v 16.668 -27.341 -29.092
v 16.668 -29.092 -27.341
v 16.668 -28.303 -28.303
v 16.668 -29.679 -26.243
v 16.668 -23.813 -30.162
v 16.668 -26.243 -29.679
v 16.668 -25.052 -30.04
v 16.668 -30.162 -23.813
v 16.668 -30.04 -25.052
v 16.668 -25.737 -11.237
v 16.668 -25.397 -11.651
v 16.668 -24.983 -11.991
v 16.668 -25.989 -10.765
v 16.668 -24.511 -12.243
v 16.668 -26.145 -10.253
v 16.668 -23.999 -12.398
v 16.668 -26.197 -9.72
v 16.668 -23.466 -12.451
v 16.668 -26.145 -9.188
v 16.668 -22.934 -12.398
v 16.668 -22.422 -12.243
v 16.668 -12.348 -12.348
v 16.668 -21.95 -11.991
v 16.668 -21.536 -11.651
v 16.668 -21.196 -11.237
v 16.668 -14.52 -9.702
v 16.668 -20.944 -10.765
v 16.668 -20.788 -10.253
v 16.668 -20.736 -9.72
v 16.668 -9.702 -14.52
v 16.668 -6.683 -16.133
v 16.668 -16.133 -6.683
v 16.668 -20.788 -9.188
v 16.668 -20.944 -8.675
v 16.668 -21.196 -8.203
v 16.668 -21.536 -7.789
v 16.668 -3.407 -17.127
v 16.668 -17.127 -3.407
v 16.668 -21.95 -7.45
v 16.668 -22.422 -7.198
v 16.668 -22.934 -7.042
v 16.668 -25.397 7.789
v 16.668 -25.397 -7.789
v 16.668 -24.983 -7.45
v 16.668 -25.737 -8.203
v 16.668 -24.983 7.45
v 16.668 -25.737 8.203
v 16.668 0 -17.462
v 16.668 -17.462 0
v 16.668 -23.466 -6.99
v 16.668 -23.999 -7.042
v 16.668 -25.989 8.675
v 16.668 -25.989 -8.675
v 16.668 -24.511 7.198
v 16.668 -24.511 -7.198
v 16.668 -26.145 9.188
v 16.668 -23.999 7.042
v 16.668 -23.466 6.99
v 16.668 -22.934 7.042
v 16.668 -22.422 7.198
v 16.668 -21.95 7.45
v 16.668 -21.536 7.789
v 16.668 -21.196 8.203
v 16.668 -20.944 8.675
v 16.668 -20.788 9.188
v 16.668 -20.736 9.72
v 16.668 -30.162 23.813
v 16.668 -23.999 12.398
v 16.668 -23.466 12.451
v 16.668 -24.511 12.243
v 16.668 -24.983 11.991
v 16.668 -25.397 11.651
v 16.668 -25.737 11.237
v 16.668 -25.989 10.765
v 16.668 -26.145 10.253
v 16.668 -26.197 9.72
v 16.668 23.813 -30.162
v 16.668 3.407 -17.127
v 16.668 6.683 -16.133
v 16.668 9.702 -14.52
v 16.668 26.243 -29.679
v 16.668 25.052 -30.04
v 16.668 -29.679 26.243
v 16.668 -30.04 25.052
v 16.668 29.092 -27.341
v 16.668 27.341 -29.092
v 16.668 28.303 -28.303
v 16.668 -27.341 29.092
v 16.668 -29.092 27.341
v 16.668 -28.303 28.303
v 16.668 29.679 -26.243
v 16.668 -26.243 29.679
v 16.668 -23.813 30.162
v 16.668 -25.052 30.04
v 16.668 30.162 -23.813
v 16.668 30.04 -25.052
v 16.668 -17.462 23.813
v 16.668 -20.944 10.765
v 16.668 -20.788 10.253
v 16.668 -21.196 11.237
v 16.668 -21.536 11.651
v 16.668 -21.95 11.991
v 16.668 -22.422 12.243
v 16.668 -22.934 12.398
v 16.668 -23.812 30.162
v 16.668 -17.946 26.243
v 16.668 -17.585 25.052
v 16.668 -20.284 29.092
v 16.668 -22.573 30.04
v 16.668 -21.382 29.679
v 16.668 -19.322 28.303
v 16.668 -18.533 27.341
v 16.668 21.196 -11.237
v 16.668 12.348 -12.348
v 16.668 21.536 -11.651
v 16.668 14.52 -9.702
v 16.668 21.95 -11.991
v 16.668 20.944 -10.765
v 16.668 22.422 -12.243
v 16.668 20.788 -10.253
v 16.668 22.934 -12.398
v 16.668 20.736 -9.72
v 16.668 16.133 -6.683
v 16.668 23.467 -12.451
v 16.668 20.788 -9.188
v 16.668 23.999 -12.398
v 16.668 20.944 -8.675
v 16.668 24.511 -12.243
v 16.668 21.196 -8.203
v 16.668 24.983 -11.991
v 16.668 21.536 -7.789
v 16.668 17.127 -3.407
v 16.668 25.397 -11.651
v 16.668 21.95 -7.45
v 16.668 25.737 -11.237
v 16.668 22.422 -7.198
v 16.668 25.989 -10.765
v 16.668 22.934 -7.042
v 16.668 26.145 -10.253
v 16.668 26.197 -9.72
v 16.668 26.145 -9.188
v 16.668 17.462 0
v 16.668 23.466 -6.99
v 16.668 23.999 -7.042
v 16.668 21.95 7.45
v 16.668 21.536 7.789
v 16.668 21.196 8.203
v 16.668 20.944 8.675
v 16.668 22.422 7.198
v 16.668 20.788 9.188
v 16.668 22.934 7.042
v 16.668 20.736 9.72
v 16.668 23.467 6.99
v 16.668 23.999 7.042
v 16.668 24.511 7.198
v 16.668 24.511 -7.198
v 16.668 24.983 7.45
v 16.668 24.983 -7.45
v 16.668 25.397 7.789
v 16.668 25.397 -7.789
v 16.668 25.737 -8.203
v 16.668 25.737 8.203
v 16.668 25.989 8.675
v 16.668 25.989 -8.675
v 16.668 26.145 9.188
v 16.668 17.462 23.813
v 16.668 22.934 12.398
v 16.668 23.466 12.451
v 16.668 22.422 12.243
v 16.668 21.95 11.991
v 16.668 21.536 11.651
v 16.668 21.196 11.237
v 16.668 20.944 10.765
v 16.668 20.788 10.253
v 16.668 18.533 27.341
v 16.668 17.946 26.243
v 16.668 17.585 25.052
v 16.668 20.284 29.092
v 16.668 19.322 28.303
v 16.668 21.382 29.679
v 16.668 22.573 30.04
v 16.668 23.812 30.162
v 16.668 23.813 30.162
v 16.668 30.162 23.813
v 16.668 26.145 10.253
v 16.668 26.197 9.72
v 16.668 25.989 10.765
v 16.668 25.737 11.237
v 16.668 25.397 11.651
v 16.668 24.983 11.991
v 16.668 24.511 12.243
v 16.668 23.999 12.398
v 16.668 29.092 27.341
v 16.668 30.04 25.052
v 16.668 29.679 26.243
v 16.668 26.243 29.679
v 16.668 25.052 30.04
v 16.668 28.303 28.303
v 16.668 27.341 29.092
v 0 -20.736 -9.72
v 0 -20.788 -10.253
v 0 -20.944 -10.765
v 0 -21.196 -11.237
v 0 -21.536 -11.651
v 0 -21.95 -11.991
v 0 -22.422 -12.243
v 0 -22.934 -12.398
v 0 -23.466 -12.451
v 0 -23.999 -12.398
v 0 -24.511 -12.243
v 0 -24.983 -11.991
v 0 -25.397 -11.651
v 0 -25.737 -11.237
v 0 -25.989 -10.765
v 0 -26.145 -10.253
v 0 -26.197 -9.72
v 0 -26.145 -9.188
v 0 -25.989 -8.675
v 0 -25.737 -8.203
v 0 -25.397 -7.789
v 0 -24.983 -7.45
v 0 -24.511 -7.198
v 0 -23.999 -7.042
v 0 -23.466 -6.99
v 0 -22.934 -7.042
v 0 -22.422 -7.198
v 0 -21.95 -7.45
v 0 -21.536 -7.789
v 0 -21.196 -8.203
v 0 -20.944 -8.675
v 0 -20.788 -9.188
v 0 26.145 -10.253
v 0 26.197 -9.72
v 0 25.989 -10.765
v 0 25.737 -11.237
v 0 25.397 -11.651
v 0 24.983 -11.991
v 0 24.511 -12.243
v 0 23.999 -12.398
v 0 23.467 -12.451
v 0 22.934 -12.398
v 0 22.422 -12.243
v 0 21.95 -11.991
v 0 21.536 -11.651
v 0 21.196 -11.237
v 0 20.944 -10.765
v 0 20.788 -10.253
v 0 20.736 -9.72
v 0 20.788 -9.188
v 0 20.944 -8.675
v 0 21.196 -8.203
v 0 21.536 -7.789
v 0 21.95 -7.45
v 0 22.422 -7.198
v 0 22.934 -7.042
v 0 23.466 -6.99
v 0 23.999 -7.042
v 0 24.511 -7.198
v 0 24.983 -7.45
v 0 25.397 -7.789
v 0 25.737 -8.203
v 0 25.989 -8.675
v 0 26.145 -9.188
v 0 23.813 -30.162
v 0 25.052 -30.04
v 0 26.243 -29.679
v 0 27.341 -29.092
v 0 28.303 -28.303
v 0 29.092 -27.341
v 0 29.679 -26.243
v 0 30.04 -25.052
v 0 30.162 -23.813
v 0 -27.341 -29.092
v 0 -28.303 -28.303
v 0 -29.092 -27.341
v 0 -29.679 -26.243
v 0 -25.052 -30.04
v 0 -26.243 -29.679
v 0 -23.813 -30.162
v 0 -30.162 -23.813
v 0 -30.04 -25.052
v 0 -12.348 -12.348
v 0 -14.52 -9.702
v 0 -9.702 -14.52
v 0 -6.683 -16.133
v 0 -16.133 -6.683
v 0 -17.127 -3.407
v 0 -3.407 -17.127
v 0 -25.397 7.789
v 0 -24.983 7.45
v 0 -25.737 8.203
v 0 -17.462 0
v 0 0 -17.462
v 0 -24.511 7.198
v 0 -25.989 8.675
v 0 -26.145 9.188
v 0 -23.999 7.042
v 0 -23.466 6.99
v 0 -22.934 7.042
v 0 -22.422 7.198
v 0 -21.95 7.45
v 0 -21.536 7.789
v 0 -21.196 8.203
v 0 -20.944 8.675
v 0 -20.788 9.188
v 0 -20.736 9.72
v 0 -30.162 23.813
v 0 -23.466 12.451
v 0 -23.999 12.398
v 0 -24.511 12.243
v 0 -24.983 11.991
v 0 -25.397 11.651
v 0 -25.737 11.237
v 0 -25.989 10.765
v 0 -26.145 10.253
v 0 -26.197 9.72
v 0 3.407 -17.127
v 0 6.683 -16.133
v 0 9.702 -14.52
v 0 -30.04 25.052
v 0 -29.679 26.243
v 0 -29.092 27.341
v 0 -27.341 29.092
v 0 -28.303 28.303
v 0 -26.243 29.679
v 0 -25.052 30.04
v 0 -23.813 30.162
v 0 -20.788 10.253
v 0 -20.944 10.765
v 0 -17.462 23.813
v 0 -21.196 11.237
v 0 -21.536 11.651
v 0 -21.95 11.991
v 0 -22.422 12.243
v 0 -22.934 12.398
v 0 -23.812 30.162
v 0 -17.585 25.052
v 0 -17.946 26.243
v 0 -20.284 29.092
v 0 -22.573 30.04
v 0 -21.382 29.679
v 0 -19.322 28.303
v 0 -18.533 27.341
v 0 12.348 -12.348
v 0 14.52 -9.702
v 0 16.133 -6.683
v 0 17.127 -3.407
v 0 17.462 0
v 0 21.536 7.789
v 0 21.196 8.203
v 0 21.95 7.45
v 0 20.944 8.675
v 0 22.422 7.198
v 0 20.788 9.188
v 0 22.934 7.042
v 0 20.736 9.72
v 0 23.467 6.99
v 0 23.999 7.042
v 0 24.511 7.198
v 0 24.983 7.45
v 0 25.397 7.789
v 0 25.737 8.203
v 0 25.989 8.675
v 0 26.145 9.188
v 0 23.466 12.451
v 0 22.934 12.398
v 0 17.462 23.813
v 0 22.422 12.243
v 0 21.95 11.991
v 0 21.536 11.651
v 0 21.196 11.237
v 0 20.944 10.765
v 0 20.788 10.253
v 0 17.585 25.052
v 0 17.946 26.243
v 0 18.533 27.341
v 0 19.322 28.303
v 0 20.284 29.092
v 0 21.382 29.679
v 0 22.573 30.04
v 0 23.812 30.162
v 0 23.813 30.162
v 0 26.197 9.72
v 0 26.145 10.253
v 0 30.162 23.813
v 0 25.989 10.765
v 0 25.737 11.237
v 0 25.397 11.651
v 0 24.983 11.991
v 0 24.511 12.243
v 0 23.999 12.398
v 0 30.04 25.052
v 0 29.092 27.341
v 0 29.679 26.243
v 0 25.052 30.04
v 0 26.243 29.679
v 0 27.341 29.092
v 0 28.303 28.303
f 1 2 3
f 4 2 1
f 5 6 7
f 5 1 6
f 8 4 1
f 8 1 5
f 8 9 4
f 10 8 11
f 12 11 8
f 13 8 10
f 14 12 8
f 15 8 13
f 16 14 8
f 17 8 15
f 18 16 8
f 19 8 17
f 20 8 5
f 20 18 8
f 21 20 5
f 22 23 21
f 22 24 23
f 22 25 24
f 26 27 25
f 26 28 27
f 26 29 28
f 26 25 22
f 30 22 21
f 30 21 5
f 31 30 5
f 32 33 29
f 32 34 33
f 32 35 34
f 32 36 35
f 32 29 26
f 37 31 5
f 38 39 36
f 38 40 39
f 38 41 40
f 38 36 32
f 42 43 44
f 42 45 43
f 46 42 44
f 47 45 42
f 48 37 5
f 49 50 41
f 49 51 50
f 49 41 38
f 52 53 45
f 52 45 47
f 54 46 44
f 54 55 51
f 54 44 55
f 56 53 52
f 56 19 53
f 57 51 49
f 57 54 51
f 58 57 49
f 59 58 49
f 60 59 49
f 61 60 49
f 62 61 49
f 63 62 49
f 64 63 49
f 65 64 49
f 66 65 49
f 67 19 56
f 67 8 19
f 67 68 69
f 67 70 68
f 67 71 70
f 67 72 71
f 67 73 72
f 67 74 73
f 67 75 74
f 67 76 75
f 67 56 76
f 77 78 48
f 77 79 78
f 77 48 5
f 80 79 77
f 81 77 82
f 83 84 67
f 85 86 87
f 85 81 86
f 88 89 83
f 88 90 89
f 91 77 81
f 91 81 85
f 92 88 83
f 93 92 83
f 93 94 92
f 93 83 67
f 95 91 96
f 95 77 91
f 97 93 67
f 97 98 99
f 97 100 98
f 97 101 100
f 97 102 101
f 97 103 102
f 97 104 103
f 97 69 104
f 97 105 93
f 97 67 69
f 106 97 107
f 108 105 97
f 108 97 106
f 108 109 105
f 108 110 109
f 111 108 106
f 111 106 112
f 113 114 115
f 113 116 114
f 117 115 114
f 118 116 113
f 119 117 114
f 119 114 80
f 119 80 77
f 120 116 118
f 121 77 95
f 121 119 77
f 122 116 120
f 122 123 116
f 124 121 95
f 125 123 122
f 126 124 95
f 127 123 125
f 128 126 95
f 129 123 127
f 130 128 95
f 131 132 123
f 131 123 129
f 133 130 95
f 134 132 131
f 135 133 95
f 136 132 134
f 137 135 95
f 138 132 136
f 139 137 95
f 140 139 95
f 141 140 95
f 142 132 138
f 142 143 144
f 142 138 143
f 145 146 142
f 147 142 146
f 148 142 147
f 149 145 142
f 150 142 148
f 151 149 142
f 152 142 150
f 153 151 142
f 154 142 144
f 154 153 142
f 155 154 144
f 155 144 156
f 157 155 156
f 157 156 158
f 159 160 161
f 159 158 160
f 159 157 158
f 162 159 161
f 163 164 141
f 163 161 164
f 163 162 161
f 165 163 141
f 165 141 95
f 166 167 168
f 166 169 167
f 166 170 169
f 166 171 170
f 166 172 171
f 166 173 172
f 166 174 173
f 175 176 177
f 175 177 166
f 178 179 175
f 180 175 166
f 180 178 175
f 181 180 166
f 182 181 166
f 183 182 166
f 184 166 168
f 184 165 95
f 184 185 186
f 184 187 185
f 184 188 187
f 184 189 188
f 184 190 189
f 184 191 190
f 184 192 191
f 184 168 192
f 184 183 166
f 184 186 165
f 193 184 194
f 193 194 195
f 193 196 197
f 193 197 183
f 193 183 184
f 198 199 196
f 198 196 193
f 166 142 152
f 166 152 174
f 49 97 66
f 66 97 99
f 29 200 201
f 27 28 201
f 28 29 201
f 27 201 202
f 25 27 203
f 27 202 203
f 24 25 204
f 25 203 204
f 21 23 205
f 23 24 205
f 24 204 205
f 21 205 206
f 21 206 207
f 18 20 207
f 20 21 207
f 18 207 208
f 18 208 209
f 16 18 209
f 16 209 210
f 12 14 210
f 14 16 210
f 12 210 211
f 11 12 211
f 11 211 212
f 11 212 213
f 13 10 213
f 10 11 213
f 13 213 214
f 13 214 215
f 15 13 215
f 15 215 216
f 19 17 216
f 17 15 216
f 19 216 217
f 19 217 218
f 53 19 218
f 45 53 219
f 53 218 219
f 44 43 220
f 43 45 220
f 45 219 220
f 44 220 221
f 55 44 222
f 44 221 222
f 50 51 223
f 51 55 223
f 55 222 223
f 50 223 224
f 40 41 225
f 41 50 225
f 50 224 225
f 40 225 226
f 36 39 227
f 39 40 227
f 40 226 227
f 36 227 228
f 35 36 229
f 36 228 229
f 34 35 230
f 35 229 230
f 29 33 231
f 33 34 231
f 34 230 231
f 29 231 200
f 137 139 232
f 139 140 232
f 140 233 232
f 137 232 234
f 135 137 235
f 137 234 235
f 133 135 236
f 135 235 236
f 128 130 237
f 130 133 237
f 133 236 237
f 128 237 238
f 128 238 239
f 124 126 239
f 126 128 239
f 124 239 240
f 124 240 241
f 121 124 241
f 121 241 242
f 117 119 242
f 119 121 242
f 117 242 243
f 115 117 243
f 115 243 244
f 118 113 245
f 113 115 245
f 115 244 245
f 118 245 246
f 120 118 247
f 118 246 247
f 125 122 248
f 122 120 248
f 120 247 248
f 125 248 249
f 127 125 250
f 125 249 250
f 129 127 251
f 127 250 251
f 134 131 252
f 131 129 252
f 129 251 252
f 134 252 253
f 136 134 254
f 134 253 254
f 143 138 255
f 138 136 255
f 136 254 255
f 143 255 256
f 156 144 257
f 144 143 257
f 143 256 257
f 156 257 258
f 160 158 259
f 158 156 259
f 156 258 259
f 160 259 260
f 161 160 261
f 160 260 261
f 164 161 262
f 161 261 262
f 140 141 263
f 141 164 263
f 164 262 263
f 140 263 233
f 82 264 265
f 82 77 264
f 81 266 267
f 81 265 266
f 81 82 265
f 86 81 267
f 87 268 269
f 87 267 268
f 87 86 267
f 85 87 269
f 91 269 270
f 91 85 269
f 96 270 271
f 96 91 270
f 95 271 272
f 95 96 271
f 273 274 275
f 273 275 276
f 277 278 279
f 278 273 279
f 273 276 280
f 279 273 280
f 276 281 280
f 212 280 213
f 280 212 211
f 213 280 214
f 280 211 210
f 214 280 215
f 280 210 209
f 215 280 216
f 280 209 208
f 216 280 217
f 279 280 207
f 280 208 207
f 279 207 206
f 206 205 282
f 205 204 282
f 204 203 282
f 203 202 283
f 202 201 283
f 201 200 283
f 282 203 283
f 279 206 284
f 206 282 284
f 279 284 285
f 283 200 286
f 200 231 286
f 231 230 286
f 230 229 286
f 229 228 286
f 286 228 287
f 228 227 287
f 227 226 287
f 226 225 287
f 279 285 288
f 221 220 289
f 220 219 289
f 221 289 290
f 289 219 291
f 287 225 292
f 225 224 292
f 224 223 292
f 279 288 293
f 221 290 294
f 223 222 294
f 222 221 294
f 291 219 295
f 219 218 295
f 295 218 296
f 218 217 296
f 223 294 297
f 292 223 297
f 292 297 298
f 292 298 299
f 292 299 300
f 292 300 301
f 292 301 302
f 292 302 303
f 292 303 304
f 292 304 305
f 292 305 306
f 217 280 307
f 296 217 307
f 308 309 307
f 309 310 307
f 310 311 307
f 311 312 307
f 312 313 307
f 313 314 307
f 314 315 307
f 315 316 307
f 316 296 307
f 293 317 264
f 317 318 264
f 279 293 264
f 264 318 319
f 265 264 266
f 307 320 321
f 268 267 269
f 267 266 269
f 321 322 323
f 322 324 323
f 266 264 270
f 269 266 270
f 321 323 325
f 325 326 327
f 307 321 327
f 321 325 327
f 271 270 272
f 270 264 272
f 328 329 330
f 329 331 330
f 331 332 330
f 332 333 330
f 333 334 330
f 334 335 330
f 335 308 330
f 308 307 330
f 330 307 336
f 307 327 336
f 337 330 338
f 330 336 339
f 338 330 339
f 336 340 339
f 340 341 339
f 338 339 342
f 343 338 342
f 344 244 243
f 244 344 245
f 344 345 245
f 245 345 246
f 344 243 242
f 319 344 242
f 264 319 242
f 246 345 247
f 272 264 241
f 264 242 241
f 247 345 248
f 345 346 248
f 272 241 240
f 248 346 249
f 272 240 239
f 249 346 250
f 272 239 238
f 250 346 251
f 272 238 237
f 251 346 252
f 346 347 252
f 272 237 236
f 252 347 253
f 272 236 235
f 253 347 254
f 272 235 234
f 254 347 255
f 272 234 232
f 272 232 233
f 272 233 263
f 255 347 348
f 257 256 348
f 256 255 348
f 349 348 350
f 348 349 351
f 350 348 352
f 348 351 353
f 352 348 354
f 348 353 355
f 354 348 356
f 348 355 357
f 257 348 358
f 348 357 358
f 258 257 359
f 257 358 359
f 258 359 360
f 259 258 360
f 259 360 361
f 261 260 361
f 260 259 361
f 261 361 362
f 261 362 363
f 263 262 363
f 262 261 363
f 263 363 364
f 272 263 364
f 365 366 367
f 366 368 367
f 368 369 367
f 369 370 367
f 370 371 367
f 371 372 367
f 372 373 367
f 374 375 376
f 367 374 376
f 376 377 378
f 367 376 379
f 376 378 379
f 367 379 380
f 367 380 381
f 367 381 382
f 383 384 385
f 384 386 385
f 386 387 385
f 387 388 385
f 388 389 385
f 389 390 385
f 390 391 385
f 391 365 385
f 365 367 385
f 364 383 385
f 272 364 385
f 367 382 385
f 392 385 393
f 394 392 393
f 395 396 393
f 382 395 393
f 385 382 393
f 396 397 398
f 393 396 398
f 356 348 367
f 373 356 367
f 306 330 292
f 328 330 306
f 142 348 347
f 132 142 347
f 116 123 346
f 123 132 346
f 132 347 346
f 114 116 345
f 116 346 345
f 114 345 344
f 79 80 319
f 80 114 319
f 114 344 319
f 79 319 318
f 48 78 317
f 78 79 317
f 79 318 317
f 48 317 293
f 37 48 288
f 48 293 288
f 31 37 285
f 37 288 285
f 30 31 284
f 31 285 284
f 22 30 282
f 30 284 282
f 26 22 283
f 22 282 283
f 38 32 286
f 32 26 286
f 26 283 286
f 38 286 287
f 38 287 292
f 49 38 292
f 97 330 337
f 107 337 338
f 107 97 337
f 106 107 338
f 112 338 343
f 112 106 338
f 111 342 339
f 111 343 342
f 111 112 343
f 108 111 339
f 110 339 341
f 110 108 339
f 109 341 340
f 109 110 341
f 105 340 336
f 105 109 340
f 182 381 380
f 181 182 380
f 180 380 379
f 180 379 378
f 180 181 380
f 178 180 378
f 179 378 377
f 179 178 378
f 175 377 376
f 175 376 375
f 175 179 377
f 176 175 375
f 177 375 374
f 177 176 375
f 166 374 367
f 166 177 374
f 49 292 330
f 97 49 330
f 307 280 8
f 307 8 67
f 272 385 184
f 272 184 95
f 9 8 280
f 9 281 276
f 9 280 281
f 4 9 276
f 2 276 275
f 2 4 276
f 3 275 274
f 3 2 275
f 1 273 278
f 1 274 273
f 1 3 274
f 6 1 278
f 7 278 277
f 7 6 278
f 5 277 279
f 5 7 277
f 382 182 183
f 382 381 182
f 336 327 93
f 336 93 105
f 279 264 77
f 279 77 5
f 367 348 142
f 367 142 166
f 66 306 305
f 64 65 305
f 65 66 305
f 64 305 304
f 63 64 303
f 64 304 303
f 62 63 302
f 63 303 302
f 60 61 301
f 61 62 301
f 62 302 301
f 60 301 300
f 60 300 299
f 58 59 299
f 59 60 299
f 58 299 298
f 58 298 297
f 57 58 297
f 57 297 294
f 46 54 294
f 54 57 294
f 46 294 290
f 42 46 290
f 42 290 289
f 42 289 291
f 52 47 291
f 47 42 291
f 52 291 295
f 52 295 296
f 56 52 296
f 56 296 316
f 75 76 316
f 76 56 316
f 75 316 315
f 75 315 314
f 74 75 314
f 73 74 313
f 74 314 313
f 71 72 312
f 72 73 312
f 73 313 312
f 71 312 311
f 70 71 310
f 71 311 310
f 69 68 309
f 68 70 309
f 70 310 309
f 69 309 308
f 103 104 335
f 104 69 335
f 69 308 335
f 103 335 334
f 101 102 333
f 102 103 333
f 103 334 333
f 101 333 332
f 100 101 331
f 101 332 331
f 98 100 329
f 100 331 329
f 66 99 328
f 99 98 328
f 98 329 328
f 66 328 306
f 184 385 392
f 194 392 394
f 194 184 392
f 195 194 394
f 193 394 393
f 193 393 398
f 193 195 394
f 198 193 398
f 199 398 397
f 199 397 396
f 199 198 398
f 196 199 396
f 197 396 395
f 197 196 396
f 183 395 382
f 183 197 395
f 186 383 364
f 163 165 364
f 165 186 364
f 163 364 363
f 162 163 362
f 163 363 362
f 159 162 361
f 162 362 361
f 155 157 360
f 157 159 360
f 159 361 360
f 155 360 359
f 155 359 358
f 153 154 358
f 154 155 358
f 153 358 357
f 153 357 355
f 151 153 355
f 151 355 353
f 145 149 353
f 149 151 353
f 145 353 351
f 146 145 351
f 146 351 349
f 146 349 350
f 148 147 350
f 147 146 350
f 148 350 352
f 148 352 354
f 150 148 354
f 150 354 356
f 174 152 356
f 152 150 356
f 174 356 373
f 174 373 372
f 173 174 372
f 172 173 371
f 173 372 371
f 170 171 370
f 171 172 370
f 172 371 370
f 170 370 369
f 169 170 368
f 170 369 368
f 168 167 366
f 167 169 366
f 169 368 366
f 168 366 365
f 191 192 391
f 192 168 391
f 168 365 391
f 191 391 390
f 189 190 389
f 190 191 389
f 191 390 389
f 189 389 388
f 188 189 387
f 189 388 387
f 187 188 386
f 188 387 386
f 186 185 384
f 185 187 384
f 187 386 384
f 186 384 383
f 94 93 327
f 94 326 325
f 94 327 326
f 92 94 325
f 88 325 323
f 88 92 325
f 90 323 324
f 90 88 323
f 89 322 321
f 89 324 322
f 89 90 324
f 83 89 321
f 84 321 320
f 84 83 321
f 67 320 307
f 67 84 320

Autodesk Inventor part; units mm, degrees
ref_plane "YZ Plane" through (0, 0, 0) normal (1, 0, 0) x (0, 1, 0)
ref_plane "XZ Plane" through (0, 0, 0) normal (0, 1, 0) x (-1, 0, 0)
ref_plane "XY Plane" through (0, 0, 0) normal (0, 0, 1) x (1, 0, 0)
sketch "Sketch2" plane through (0, 0, 0) normal (1, 0, 0) x (0, 1, 0)
  line L0 (30.1625, 30.1625) -> (30.1625, -30.1625)
  line L1 (30.1625, -30.1625) -> (-30.1625, -30.1625)
  line L2 (-30.1625, -30.1625) -> (-30.1625, 30.1625)
  line L3 (-30.1625, 30.1625) -> (30.1625, -30.1625) construction
  line L4 (30.1625, 30.1625) -> (-30.1625, -30.1625) construction
  arc A0 (-17.4625, 0) -> (17.4625, 0) centre (0, 0) ccw
  circle A1 centre (-23.4665, 9.7202) radius 2.7305
  circle A2 centre (-23.4665, -9.7202) radius 2.7305
  circle A3 centre (-9.7202, -23.4665) radius 2.7305
  circle A4 centre (9.7202, -23.4665) radius 2.7305
  circle A5 centre (23.4665, -9.7202) radius 2.7305
  circle A6 centre (23.4665, 9.7202) radius 2.7305
  circle A7 centre (9.7202, 23.4665) radius 2.7305
  circle A8 centre (-9.7202, 23.4665) radius 2.7305
  line L5 (-17.4625, 0) -> (-17.4625, 30.1625)
  line L6 (17.4625, 0) -> (17.4625, 30.1625)
  line L7 (-30.1625, 30.1625) -> (-17.4625, 30.1625)
  line L8 (17.4625, 30.1625) -> (30.1625, 30.1625)
  dimension "d14" = 25.4
  dimension "d19" = 34.925
  dimension "d20" = 60.325
  dimension "d21" = 5.461
  dimension "d24" = 360
extrude "Extrusion1" add sketch "Sketch2" along normal blind 16.6675 contours L0 L1 L2 L7 L5 A0 L6 L8 | A3 | A4
fillet "Fillet1" radius 6.35 6 edges at (8.3337, 30.1625, -30.1625) (8.3337, 30.1625, 30.1625) (8.3337, 17.4625, 30.1625) (8.3337, -17.4625, 30.1625) (8.3337, -30.1625, 30.1625) (8.3337, -30.1625, -30.1625)
properties part number "3DPRINT,KICKER,MOTOR,MOUNT" material "Nylon 6/6"
